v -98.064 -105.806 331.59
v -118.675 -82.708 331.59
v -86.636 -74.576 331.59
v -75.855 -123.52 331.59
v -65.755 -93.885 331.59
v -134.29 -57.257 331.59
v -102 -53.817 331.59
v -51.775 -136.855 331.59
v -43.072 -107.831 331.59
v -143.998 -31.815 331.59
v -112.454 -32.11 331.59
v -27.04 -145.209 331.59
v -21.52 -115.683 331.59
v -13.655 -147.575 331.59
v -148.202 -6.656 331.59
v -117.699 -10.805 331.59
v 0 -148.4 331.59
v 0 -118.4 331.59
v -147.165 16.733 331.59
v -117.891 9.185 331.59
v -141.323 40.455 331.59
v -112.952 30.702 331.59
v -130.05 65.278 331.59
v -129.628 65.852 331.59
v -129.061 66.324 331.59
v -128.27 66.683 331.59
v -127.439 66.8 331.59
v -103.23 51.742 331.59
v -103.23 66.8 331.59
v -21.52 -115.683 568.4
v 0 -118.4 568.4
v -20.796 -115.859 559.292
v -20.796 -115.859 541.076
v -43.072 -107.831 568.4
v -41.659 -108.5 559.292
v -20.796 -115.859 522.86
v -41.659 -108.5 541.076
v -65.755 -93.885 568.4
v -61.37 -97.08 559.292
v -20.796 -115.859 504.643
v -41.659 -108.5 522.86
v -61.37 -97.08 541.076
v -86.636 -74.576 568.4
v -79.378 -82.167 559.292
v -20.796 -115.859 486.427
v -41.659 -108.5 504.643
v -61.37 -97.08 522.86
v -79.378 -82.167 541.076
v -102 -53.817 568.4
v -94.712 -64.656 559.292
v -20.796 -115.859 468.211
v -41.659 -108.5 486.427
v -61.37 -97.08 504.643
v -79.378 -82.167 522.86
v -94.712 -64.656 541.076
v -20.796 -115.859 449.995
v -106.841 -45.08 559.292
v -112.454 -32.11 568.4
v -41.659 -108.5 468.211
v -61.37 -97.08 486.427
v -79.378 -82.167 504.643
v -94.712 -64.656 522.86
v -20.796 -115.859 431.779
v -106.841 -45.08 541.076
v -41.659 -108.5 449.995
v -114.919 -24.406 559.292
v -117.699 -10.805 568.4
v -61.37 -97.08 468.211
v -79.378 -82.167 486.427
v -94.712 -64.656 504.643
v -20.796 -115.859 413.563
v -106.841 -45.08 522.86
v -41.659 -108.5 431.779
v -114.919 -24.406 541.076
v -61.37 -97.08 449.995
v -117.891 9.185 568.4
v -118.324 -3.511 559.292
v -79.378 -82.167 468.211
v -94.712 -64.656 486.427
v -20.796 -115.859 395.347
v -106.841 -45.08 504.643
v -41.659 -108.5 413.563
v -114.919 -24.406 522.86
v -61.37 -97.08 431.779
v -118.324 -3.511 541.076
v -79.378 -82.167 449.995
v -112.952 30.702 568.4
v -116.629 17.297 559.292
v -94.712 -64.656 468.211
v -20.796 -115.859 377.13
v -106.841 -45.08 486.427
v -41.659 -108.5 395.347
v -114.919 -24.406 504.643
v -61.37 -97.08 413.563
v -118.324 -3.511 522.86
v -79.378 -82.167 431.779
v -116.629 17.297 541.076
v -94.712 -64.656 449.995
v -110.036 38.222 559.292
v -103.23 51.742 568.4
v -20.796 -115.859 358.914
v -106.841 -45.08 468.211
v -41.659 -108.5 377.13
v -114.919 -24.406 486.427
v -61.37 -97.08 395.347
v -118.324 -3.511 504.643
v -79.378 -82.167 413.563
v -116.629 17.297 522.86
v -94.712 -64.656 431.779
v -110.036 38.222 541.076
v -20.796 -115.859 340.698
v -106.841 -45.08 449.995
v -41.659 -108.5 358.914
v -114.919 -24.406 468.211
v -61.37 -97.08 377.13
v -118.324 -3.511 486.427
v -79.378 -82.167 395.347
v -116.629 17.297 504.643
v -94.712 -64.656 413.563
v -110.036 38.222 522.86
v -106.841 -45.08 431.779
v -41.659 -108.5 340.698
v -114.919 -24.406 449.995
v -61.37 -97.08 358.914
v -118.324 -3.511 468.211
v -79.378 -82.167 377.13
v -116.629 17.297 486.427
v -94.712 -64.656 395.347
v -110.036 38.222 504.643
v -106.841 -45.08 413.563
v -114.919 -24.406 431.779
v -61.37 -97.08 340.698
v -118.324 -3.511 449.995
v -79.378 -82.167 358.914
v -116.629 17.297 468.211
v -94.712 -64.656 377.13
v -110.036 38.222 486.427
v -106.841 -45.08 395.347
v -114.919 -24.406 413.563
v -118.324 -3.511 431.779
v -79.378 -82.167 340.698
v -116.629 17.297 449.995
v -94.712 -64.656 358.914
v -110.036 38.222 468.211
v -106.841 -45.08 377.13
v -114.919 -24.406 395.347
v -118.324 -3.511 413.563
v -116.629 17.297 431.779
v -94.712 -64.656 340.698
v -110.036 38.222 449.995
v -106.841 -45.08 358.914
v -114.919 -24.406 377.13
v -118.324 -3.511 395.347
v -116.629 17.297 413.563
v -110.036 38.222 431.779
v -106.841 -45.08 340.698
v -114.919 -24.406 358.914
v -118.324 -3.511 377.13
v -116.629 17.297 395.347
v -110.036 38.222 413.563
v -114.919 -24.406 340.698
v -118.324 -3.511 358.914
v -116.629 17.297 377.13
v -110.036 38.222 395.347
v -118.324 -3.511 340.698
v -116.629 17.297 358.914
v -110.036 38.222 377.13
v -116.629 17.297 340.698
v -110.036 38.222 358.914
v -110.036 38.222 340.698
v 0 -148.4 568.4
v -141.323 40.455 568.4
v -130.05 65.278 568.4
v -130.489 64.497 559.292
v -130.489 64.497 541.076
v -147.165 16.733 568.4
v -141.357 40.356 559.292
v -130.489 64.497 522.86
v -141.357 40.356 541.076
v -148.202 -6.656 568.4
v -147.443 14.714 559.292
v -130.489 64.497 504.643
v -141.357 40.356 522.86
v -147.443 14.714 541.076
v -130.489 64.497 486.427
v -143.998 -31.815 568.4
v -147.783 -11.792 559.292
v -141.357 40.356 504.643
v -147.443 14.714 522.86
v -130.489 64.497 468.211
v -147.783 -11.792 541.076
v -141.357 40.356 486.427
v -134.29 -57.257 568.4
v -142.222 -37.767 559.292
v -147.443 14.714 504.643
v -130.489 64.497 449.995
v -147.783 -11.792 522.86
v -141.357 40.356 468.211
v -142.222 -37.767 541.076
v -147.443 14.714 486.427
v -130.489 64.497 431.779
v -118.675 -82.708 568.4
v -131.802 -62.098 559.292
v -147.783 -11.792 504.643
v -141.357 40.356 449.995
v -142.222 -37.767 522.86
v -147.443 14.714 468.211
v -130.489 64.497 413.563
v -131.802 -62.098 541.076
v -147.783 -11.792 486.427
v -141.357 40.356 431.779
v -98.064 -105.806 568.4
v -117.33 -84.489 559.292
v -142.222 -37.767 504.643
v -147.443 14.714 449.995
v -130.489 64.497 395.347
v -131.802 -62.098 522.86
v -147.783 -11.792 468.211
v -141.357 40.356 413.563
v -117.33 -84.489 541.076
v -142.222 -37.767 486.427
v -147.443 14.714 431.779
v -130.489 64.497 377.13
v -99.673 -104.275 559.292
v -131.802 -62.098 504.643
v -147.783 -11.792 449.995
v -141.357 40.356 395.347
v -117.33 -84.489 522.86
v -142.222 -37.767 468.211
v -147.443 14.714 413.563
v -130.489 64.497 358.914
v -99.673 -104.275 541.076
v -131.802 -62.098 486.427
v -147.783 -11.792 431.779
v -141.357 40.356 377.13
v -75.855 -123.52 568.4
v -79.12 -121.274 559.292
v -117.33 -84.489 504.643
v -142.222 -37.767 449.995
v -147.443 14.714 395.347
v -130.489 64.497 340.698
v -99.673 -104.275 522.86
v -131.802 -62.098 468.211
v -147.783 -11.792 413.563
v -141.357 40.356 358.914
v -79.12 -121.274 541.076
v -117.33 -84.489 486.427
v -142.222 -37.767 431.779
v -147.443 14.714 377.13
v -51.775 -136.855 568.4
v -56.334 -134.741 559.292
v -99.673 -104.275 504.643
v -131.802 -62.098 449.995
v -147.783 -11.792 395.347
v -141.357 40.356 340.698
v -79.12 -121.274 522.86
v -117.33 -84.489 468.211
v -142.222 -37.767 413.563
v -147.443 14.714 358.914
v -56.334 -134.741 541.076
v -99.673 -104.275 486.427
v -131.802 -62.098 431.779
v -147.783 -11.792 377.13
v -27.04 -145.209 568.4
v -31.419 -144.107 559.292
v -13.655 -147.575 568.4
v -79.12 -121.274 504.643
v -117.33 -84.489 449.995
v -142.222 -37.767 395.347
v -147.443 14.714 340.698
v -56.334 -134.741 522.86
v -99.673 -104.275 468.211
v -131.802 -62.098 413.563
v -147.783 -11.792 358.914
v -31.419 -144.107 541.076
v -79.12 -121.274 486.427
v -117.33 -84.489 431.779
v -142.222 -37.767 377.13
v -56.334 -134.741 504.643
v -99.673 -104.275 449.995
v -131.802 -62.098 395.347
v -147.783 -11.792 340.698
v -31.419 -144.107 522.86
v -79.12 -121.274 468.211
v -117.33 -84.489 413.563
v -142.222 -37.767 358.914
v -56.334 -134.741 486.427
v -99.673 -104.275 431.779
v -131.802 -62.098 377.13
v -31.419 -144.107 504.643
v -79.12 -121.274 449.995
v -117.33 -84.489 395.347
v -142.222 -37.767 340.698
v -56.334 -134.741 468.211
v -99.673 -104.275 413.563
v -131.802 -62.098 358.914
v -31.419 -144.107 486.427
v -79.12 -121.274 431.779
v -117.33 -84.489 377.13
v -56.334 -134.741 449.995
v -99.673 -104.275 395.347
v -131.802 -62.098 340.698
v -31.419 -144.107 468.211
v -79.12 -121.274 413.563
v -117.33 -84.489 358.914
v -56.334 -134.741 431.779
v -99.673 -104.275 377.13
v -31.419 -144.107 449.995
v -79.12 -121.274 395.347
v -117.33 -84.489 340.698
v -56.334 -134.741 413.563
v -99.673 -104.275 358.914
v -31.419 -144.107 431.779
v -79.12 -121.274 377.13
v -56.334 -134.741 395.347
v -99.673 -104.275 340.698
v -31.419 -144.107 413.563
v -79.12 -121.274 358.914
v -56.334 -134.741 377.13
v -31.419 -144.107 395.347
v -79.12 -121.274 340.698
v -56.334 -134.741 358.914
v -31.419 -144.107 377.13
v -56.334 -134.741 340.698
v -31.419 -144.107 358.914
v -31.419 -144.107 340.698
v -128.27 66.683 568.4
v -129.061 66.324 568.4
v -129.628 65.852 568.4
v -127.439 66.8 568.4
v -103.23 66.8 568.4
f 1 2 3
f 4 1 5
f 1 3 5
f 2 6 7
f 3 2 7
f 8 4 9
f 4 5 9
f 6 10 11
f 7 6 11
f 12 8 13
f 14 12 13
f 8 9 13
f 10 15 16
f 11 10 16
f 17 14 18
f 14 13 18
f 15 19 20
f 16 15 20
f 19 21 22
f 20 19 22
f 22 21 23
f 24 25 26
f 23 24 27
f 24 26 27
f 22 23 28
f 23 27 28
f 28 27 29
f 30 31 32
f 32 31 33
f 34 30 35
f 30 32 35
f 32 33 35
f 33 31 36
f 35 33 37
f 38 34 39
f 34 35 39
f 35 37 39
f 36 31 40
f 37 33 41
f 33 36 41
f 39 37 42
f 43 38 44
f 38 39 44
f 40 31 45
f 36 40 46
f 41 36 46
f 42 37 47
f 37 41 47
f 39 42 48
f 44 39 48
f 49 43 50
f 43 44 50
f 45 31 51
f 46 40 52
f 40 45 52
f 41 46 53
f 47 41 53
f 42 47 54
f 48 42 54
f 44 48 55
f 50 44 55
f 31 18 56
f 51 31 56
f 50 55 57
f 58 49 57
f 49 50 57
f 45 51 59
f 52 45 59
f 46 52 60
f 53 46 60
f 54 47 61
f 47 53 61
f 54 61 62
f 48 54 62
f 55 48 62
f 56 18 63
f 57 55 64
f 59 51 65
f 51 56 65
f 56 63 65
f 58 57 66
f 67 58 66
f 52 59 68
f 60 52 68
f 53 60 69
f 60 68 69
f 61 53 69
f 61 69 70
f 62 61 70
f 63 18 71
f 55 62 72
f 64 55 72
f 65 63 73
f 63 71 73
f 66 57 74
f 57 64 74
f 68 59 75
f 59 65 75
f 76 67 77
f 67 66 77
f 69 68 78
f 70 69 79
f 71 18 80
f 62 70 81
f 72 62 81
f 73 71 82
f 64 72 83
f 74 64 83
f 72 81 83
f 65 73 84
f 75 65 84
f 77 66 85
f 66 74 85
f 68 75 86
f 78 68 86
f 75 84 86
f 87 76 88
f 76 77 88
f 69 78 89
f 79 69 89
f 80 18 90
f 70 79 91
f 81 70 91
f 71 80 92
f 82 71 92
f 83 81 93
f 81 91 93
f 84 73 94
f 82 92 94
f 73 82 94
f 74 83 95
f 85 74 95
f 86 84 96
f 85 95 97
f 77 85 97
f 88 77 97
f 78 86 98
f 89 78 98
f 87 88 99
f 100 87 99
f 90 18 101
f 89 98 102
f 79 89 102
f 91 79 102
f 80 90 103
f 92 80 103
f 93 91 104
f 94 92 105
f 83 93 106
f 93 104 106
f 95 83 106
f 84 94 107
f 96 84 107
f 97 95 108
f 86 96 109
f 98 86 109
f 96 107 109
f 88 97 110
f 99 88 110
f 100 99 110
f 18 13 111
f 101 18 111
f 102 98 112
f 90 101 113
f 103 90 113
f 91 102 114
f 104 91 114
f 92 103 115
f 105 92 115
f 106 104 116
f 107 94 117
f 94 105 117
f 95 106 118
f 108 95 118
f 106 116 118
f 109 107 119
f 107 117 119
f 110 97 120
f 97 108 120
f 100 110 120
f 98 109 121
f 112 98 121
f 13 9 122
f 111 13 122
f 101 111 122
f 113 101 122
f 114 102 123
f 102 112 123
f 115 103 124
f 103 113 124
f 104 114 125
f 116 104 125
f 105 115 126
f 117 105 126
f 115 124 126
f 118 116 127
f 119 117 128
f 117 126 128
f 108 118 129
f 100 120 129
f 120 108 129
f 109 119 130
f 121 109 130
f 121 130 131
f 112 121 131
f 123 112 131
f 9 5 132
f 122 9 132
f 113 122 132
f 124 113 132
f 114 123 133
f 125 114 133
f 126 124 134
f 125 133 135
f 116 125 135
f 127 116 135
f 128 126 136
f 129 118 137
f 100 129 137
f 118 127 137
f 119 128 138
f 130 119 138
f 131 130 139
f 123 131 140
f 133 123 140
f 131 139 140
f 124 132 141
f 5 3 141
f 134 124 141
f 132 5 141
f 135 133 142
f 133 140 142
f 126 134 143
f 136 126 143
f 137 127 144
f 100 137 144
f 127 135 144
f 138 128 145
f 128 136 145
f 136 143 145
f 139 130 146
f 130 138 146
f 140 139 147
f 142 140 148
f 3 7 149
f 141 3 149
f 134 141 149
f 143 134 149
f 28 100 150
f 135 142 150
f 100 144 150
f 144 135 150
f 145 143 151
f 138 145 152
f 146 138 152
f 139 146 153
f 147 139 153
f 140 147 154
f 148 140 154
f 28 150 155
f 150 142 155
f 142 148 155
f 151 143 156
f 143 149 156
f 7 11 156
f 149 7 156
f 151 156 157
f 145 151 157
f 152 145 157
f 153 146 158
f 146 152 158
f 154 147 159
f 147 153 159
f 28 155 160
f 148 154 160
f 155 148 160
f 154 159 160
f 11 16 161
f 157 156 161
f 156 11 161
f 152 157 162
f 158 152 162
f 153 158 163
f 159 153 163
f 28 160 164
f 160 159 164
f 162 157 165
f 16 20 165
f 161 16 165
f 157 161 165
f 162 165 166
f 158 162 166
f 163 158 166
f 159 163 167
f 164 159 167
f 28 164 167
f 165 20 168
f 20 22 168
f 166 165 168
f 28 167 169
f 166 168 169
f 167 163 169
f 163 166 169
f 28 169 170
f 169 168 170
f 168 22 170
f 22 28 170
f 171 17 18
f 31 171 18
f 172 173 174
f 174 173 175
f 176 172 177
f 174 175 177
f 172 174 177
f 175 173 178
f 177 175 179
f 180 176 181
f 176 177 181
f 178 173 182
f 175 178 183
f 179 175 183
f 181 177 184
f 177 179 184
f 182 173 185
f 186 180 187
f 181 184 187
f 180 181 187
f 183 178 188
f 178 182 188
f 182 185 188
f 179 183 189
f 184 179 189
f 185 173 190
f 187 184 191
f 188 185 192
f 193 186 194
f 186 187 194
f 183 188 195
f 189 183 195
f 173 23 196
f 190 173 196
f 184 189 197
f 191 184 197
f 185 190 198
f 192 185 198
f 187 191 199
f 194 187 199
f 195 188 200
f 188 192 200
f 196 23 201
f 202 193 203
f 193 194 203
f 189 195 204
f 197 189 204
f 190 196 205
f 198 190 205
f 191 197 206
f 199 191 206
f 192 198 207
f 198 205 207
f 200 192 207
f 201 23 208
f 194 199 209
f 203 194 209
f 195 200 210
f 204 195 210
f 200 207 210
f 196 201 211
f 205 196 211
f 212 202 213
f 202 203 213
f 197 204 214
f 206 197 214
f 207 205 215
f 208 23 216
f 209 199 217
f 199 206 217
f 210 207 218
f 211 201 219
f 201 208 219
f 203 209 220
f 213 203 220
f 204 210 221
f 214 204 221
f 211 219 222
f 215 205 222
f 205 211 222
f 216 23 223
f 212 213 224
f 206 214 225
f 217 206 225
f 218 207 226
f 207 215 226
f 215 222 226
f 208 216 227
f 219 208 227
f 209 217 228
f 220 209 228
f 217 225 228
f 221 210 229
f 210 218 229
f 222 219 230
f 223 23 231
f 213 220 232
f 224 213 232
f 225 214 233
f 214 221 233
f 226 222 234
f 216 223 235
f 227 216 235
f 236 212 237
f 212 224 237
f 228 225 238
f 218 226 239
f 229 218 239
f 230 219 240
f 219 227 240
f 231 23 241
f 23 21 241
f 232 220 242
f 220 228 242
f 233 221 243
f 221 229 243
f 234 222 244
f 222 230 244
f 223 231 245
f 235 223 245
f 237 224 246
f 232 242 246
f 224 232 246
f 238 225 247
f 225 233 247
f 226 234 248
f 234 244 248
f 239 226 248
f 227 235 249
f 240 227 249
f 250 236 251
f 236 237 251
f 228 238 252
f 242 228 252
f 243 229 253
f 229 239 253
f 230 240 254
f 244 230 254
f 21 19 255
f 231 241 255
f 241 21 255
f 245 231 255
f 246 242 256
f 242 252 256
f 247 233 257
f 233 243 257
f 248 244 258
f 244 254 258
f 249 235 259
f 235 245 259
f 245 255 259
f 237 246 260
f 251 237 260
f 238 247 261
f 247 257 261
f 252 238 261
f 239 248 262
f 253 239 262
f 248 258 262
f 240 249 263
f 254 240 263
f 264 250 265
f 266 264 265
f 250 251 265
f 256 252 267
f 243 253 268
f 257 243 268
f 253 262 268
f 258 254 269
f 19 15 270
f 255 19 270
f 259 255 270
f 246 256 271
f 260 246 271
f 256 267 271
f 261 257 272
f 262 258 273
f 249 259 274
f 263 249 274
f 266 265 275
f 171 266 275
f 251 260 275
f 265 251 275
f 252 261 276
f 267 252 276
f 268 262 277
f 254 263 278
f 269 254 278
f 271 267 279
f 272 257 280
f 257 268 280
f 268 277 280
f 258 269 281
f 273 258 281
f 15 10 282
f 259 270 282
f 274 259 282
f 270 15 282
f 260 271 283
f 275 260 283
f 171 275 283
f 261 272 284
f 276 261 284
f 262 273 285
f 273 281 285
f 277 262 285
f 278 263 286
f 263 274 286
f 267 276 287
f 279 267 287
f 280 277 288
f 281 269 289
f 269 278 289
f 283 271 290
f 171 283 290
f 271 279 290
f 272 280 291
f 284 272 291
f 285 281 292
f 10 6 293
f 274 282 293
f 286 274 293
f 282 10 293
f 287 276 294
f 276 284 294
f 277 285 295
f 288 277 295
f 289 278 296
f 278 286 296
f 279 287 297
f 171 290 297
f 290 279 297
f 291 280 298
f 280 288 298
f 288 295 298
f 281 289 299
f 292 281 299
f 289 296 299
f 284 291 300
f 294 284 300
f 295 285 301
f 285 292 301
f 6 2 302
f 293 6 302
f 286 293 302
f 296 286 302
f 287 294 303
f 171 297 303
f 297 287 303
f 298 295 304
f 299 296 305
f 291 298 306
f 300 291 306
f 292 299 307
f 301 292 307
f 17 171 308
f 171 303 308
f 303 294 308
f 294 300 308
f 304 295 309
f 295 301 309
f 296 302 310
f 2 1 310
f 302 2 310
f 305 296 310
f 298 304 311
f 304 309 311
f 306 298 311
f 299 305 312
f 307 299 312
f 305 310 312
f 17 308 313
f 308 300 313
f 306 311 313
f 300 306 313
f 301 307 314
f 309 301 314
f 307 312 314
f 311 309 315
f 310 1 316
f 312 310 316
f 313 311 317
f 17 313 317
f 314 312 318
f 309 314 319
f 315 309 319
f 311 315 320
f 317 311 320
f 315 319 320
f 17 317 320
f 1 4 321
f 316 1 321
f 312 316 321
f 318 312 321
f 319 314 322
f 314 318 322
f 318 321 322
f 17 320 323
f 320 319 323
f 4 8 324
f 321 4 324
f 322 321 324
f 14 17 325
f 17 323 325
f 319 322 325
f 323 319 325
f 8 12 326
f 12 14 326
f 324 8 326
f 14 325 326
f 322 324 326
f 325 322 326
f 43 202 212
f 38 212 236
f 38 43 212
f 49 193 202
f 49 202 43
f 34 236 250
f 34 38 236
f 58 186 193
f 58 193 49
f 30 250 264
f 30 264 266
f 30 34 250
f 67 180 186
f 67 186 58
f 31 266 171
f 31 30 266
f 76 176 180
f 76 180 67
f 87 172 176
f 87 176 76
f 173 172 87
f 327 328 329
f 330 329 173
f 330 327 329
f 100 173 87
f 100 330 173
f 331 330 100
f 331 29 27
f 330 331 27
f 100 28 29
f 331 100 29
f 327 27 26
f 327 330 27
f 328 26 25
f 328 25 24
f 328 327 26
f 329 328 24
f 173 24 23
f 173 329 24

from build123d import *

# Parameters (mm, degrees)
STOCK_PAYLOAD_BAY_1_START = 331.59
STOCK_PAYLOAD_BAY_1_DEPTH = 236.810025
FILLET1_R                 = 3


# Read off the part's stored shape, not the designer's step: Stock-Payload_bay-1
with BuildPart() as part:
    # Stock-Payload_bay-1 outline → Stock-Payload_bay-1 (new body)
    with BuildSketch(Plane.XY.offset(STOCK_PAYLOAD_BAY_1_START)):
        with BuildLine():
            Line((-103.230490722, 66.8), (-129.177697638, 66.8))
            add(Edge.make_bspline(
                [(-129.177697638, 66.8), (-129.620986666, 66.036144557), (-131.753376368, 62.291446965), (-135.362753212, 55.314865151), (-139.587846981, 45.554685292), (-143.085982258, 35.480371977), (-145.768738443, 25.217208127), (-147.598187785, 14.756187222), (-148.496219867, 4.04425788), (-148.371326584, -6.539331808), (-147.273953028, -17.050292148), (-145.252404256, -27.49737261), (-141.377832301, -41.272176246), (-136.008827451, -54.314250652), (-129.322136126, -66.786199843), (-123.638884314, -75.879723374), (-117.410839628, -84.564797072), (-108.463999756, -95.539360338), (-96.108090183, -108.196956109), (-79.329305457, -121.670886231), (-64.299288616, -130.914132781), (-51.579681827, -137.079745612), (-41.624388524, -141.055777896), (-31.440015392, -144.248668387), (-21.132268456, -146.591416073), (-12.406389282, -147.811759094), (-5.350229412, -148.314037414), (-1.78044168, -148.400358856), (0, -148.400358856)],
                knots=[0.118137711, 0.118137711, 0.118137711, 0.118137711, 0.125950211, 0.15625, 0.1875, 0.21875, 0.25, 0.28125, 0.3125, 0.34375, 0.375, 0.40625, 0.4375, 0.5, 0.53125, 0.5625, 0.59375, 0.625, 0.6875, 0.75, 0.8125, 0.84375, 0.875, 0.90625, 0.9375, 0.96875, 0.984375, 1, 1, 1, 1], degree=3))
            Line((0, -148.400358856), (0, -118.400358856))
            add(Edge.make_bspline(
                [(0, -118.400358856), (-2.303693392, -118.400358856), (-6.898551381, -118.2050796), (-16.140086281, -117.063562247), (-27.770620909, -114.278096666), (-41.777508235, -108.787982079), (-52.858828085, -102.773031903), (-61.393202724, -97.151668291), (-67.655072466, -92.508478947), (-73.698942945, -87.500892571), (-79.431014325, -82.211674373), (-84.845879459, -76.652178794), (-91.679619901, -68.852889603), (-97.861381013, -60.540164894), (-103.300564171, -51.770334803), (-106.913108194, -45.10175935), (-110.090532471, -38.300194601), (-113.679857665, -29.149374039), (-116.331962276, -19.674094756), (-117.84305713, -10.383476032), (-118.417692188, -3.496644211), (-118.429616299, 3.303725764), (-117.852853719, 10.322362118), (-116.719335417, 17.290902684), (-115.041411044, 24.294482859), (-112.843468002, 31.263436572), (-109.206181561, 40.566182867), (-105.762926527, 47.378252328), (-103.230490722, 51.742030241)],
                knots=[0.118137711, 0.118137711, 0.118137711, 0.118137711, 0.145695908, 0.173254104, 0.228370497, 0.28348689, 0.338603283, 0.36616148, 0.393719676, 0.421277873, 0.448836069, 0.476394266, 0.503952462, 0.559068856, 0.586627052, 0.614185249, 0.641743445, 0.669301642, 0.724418035, 0.751976231, 0.779534428, 0.807092624, 0.834650821, 0.862209017, 0.889767214, 0.91732541, 0.944883607, 1, 1, 1, 1], degree=3))
            Line((-103.230490722, 51.742030241), (-103.230490722, 66.8))
        make_face()
    extrude(amount=STOCK_PAYLOAD_BAY_1_DEPTH)

    # Fillet1
    fillet1_edges = [part.edges().sort_by_distance(p)[0] for p in [
        (-129.177697638, 66.8, 449.9950125),
    ]]
    fillet(fillet1_edges, radius=FILLET1_R)


solid = part.part
